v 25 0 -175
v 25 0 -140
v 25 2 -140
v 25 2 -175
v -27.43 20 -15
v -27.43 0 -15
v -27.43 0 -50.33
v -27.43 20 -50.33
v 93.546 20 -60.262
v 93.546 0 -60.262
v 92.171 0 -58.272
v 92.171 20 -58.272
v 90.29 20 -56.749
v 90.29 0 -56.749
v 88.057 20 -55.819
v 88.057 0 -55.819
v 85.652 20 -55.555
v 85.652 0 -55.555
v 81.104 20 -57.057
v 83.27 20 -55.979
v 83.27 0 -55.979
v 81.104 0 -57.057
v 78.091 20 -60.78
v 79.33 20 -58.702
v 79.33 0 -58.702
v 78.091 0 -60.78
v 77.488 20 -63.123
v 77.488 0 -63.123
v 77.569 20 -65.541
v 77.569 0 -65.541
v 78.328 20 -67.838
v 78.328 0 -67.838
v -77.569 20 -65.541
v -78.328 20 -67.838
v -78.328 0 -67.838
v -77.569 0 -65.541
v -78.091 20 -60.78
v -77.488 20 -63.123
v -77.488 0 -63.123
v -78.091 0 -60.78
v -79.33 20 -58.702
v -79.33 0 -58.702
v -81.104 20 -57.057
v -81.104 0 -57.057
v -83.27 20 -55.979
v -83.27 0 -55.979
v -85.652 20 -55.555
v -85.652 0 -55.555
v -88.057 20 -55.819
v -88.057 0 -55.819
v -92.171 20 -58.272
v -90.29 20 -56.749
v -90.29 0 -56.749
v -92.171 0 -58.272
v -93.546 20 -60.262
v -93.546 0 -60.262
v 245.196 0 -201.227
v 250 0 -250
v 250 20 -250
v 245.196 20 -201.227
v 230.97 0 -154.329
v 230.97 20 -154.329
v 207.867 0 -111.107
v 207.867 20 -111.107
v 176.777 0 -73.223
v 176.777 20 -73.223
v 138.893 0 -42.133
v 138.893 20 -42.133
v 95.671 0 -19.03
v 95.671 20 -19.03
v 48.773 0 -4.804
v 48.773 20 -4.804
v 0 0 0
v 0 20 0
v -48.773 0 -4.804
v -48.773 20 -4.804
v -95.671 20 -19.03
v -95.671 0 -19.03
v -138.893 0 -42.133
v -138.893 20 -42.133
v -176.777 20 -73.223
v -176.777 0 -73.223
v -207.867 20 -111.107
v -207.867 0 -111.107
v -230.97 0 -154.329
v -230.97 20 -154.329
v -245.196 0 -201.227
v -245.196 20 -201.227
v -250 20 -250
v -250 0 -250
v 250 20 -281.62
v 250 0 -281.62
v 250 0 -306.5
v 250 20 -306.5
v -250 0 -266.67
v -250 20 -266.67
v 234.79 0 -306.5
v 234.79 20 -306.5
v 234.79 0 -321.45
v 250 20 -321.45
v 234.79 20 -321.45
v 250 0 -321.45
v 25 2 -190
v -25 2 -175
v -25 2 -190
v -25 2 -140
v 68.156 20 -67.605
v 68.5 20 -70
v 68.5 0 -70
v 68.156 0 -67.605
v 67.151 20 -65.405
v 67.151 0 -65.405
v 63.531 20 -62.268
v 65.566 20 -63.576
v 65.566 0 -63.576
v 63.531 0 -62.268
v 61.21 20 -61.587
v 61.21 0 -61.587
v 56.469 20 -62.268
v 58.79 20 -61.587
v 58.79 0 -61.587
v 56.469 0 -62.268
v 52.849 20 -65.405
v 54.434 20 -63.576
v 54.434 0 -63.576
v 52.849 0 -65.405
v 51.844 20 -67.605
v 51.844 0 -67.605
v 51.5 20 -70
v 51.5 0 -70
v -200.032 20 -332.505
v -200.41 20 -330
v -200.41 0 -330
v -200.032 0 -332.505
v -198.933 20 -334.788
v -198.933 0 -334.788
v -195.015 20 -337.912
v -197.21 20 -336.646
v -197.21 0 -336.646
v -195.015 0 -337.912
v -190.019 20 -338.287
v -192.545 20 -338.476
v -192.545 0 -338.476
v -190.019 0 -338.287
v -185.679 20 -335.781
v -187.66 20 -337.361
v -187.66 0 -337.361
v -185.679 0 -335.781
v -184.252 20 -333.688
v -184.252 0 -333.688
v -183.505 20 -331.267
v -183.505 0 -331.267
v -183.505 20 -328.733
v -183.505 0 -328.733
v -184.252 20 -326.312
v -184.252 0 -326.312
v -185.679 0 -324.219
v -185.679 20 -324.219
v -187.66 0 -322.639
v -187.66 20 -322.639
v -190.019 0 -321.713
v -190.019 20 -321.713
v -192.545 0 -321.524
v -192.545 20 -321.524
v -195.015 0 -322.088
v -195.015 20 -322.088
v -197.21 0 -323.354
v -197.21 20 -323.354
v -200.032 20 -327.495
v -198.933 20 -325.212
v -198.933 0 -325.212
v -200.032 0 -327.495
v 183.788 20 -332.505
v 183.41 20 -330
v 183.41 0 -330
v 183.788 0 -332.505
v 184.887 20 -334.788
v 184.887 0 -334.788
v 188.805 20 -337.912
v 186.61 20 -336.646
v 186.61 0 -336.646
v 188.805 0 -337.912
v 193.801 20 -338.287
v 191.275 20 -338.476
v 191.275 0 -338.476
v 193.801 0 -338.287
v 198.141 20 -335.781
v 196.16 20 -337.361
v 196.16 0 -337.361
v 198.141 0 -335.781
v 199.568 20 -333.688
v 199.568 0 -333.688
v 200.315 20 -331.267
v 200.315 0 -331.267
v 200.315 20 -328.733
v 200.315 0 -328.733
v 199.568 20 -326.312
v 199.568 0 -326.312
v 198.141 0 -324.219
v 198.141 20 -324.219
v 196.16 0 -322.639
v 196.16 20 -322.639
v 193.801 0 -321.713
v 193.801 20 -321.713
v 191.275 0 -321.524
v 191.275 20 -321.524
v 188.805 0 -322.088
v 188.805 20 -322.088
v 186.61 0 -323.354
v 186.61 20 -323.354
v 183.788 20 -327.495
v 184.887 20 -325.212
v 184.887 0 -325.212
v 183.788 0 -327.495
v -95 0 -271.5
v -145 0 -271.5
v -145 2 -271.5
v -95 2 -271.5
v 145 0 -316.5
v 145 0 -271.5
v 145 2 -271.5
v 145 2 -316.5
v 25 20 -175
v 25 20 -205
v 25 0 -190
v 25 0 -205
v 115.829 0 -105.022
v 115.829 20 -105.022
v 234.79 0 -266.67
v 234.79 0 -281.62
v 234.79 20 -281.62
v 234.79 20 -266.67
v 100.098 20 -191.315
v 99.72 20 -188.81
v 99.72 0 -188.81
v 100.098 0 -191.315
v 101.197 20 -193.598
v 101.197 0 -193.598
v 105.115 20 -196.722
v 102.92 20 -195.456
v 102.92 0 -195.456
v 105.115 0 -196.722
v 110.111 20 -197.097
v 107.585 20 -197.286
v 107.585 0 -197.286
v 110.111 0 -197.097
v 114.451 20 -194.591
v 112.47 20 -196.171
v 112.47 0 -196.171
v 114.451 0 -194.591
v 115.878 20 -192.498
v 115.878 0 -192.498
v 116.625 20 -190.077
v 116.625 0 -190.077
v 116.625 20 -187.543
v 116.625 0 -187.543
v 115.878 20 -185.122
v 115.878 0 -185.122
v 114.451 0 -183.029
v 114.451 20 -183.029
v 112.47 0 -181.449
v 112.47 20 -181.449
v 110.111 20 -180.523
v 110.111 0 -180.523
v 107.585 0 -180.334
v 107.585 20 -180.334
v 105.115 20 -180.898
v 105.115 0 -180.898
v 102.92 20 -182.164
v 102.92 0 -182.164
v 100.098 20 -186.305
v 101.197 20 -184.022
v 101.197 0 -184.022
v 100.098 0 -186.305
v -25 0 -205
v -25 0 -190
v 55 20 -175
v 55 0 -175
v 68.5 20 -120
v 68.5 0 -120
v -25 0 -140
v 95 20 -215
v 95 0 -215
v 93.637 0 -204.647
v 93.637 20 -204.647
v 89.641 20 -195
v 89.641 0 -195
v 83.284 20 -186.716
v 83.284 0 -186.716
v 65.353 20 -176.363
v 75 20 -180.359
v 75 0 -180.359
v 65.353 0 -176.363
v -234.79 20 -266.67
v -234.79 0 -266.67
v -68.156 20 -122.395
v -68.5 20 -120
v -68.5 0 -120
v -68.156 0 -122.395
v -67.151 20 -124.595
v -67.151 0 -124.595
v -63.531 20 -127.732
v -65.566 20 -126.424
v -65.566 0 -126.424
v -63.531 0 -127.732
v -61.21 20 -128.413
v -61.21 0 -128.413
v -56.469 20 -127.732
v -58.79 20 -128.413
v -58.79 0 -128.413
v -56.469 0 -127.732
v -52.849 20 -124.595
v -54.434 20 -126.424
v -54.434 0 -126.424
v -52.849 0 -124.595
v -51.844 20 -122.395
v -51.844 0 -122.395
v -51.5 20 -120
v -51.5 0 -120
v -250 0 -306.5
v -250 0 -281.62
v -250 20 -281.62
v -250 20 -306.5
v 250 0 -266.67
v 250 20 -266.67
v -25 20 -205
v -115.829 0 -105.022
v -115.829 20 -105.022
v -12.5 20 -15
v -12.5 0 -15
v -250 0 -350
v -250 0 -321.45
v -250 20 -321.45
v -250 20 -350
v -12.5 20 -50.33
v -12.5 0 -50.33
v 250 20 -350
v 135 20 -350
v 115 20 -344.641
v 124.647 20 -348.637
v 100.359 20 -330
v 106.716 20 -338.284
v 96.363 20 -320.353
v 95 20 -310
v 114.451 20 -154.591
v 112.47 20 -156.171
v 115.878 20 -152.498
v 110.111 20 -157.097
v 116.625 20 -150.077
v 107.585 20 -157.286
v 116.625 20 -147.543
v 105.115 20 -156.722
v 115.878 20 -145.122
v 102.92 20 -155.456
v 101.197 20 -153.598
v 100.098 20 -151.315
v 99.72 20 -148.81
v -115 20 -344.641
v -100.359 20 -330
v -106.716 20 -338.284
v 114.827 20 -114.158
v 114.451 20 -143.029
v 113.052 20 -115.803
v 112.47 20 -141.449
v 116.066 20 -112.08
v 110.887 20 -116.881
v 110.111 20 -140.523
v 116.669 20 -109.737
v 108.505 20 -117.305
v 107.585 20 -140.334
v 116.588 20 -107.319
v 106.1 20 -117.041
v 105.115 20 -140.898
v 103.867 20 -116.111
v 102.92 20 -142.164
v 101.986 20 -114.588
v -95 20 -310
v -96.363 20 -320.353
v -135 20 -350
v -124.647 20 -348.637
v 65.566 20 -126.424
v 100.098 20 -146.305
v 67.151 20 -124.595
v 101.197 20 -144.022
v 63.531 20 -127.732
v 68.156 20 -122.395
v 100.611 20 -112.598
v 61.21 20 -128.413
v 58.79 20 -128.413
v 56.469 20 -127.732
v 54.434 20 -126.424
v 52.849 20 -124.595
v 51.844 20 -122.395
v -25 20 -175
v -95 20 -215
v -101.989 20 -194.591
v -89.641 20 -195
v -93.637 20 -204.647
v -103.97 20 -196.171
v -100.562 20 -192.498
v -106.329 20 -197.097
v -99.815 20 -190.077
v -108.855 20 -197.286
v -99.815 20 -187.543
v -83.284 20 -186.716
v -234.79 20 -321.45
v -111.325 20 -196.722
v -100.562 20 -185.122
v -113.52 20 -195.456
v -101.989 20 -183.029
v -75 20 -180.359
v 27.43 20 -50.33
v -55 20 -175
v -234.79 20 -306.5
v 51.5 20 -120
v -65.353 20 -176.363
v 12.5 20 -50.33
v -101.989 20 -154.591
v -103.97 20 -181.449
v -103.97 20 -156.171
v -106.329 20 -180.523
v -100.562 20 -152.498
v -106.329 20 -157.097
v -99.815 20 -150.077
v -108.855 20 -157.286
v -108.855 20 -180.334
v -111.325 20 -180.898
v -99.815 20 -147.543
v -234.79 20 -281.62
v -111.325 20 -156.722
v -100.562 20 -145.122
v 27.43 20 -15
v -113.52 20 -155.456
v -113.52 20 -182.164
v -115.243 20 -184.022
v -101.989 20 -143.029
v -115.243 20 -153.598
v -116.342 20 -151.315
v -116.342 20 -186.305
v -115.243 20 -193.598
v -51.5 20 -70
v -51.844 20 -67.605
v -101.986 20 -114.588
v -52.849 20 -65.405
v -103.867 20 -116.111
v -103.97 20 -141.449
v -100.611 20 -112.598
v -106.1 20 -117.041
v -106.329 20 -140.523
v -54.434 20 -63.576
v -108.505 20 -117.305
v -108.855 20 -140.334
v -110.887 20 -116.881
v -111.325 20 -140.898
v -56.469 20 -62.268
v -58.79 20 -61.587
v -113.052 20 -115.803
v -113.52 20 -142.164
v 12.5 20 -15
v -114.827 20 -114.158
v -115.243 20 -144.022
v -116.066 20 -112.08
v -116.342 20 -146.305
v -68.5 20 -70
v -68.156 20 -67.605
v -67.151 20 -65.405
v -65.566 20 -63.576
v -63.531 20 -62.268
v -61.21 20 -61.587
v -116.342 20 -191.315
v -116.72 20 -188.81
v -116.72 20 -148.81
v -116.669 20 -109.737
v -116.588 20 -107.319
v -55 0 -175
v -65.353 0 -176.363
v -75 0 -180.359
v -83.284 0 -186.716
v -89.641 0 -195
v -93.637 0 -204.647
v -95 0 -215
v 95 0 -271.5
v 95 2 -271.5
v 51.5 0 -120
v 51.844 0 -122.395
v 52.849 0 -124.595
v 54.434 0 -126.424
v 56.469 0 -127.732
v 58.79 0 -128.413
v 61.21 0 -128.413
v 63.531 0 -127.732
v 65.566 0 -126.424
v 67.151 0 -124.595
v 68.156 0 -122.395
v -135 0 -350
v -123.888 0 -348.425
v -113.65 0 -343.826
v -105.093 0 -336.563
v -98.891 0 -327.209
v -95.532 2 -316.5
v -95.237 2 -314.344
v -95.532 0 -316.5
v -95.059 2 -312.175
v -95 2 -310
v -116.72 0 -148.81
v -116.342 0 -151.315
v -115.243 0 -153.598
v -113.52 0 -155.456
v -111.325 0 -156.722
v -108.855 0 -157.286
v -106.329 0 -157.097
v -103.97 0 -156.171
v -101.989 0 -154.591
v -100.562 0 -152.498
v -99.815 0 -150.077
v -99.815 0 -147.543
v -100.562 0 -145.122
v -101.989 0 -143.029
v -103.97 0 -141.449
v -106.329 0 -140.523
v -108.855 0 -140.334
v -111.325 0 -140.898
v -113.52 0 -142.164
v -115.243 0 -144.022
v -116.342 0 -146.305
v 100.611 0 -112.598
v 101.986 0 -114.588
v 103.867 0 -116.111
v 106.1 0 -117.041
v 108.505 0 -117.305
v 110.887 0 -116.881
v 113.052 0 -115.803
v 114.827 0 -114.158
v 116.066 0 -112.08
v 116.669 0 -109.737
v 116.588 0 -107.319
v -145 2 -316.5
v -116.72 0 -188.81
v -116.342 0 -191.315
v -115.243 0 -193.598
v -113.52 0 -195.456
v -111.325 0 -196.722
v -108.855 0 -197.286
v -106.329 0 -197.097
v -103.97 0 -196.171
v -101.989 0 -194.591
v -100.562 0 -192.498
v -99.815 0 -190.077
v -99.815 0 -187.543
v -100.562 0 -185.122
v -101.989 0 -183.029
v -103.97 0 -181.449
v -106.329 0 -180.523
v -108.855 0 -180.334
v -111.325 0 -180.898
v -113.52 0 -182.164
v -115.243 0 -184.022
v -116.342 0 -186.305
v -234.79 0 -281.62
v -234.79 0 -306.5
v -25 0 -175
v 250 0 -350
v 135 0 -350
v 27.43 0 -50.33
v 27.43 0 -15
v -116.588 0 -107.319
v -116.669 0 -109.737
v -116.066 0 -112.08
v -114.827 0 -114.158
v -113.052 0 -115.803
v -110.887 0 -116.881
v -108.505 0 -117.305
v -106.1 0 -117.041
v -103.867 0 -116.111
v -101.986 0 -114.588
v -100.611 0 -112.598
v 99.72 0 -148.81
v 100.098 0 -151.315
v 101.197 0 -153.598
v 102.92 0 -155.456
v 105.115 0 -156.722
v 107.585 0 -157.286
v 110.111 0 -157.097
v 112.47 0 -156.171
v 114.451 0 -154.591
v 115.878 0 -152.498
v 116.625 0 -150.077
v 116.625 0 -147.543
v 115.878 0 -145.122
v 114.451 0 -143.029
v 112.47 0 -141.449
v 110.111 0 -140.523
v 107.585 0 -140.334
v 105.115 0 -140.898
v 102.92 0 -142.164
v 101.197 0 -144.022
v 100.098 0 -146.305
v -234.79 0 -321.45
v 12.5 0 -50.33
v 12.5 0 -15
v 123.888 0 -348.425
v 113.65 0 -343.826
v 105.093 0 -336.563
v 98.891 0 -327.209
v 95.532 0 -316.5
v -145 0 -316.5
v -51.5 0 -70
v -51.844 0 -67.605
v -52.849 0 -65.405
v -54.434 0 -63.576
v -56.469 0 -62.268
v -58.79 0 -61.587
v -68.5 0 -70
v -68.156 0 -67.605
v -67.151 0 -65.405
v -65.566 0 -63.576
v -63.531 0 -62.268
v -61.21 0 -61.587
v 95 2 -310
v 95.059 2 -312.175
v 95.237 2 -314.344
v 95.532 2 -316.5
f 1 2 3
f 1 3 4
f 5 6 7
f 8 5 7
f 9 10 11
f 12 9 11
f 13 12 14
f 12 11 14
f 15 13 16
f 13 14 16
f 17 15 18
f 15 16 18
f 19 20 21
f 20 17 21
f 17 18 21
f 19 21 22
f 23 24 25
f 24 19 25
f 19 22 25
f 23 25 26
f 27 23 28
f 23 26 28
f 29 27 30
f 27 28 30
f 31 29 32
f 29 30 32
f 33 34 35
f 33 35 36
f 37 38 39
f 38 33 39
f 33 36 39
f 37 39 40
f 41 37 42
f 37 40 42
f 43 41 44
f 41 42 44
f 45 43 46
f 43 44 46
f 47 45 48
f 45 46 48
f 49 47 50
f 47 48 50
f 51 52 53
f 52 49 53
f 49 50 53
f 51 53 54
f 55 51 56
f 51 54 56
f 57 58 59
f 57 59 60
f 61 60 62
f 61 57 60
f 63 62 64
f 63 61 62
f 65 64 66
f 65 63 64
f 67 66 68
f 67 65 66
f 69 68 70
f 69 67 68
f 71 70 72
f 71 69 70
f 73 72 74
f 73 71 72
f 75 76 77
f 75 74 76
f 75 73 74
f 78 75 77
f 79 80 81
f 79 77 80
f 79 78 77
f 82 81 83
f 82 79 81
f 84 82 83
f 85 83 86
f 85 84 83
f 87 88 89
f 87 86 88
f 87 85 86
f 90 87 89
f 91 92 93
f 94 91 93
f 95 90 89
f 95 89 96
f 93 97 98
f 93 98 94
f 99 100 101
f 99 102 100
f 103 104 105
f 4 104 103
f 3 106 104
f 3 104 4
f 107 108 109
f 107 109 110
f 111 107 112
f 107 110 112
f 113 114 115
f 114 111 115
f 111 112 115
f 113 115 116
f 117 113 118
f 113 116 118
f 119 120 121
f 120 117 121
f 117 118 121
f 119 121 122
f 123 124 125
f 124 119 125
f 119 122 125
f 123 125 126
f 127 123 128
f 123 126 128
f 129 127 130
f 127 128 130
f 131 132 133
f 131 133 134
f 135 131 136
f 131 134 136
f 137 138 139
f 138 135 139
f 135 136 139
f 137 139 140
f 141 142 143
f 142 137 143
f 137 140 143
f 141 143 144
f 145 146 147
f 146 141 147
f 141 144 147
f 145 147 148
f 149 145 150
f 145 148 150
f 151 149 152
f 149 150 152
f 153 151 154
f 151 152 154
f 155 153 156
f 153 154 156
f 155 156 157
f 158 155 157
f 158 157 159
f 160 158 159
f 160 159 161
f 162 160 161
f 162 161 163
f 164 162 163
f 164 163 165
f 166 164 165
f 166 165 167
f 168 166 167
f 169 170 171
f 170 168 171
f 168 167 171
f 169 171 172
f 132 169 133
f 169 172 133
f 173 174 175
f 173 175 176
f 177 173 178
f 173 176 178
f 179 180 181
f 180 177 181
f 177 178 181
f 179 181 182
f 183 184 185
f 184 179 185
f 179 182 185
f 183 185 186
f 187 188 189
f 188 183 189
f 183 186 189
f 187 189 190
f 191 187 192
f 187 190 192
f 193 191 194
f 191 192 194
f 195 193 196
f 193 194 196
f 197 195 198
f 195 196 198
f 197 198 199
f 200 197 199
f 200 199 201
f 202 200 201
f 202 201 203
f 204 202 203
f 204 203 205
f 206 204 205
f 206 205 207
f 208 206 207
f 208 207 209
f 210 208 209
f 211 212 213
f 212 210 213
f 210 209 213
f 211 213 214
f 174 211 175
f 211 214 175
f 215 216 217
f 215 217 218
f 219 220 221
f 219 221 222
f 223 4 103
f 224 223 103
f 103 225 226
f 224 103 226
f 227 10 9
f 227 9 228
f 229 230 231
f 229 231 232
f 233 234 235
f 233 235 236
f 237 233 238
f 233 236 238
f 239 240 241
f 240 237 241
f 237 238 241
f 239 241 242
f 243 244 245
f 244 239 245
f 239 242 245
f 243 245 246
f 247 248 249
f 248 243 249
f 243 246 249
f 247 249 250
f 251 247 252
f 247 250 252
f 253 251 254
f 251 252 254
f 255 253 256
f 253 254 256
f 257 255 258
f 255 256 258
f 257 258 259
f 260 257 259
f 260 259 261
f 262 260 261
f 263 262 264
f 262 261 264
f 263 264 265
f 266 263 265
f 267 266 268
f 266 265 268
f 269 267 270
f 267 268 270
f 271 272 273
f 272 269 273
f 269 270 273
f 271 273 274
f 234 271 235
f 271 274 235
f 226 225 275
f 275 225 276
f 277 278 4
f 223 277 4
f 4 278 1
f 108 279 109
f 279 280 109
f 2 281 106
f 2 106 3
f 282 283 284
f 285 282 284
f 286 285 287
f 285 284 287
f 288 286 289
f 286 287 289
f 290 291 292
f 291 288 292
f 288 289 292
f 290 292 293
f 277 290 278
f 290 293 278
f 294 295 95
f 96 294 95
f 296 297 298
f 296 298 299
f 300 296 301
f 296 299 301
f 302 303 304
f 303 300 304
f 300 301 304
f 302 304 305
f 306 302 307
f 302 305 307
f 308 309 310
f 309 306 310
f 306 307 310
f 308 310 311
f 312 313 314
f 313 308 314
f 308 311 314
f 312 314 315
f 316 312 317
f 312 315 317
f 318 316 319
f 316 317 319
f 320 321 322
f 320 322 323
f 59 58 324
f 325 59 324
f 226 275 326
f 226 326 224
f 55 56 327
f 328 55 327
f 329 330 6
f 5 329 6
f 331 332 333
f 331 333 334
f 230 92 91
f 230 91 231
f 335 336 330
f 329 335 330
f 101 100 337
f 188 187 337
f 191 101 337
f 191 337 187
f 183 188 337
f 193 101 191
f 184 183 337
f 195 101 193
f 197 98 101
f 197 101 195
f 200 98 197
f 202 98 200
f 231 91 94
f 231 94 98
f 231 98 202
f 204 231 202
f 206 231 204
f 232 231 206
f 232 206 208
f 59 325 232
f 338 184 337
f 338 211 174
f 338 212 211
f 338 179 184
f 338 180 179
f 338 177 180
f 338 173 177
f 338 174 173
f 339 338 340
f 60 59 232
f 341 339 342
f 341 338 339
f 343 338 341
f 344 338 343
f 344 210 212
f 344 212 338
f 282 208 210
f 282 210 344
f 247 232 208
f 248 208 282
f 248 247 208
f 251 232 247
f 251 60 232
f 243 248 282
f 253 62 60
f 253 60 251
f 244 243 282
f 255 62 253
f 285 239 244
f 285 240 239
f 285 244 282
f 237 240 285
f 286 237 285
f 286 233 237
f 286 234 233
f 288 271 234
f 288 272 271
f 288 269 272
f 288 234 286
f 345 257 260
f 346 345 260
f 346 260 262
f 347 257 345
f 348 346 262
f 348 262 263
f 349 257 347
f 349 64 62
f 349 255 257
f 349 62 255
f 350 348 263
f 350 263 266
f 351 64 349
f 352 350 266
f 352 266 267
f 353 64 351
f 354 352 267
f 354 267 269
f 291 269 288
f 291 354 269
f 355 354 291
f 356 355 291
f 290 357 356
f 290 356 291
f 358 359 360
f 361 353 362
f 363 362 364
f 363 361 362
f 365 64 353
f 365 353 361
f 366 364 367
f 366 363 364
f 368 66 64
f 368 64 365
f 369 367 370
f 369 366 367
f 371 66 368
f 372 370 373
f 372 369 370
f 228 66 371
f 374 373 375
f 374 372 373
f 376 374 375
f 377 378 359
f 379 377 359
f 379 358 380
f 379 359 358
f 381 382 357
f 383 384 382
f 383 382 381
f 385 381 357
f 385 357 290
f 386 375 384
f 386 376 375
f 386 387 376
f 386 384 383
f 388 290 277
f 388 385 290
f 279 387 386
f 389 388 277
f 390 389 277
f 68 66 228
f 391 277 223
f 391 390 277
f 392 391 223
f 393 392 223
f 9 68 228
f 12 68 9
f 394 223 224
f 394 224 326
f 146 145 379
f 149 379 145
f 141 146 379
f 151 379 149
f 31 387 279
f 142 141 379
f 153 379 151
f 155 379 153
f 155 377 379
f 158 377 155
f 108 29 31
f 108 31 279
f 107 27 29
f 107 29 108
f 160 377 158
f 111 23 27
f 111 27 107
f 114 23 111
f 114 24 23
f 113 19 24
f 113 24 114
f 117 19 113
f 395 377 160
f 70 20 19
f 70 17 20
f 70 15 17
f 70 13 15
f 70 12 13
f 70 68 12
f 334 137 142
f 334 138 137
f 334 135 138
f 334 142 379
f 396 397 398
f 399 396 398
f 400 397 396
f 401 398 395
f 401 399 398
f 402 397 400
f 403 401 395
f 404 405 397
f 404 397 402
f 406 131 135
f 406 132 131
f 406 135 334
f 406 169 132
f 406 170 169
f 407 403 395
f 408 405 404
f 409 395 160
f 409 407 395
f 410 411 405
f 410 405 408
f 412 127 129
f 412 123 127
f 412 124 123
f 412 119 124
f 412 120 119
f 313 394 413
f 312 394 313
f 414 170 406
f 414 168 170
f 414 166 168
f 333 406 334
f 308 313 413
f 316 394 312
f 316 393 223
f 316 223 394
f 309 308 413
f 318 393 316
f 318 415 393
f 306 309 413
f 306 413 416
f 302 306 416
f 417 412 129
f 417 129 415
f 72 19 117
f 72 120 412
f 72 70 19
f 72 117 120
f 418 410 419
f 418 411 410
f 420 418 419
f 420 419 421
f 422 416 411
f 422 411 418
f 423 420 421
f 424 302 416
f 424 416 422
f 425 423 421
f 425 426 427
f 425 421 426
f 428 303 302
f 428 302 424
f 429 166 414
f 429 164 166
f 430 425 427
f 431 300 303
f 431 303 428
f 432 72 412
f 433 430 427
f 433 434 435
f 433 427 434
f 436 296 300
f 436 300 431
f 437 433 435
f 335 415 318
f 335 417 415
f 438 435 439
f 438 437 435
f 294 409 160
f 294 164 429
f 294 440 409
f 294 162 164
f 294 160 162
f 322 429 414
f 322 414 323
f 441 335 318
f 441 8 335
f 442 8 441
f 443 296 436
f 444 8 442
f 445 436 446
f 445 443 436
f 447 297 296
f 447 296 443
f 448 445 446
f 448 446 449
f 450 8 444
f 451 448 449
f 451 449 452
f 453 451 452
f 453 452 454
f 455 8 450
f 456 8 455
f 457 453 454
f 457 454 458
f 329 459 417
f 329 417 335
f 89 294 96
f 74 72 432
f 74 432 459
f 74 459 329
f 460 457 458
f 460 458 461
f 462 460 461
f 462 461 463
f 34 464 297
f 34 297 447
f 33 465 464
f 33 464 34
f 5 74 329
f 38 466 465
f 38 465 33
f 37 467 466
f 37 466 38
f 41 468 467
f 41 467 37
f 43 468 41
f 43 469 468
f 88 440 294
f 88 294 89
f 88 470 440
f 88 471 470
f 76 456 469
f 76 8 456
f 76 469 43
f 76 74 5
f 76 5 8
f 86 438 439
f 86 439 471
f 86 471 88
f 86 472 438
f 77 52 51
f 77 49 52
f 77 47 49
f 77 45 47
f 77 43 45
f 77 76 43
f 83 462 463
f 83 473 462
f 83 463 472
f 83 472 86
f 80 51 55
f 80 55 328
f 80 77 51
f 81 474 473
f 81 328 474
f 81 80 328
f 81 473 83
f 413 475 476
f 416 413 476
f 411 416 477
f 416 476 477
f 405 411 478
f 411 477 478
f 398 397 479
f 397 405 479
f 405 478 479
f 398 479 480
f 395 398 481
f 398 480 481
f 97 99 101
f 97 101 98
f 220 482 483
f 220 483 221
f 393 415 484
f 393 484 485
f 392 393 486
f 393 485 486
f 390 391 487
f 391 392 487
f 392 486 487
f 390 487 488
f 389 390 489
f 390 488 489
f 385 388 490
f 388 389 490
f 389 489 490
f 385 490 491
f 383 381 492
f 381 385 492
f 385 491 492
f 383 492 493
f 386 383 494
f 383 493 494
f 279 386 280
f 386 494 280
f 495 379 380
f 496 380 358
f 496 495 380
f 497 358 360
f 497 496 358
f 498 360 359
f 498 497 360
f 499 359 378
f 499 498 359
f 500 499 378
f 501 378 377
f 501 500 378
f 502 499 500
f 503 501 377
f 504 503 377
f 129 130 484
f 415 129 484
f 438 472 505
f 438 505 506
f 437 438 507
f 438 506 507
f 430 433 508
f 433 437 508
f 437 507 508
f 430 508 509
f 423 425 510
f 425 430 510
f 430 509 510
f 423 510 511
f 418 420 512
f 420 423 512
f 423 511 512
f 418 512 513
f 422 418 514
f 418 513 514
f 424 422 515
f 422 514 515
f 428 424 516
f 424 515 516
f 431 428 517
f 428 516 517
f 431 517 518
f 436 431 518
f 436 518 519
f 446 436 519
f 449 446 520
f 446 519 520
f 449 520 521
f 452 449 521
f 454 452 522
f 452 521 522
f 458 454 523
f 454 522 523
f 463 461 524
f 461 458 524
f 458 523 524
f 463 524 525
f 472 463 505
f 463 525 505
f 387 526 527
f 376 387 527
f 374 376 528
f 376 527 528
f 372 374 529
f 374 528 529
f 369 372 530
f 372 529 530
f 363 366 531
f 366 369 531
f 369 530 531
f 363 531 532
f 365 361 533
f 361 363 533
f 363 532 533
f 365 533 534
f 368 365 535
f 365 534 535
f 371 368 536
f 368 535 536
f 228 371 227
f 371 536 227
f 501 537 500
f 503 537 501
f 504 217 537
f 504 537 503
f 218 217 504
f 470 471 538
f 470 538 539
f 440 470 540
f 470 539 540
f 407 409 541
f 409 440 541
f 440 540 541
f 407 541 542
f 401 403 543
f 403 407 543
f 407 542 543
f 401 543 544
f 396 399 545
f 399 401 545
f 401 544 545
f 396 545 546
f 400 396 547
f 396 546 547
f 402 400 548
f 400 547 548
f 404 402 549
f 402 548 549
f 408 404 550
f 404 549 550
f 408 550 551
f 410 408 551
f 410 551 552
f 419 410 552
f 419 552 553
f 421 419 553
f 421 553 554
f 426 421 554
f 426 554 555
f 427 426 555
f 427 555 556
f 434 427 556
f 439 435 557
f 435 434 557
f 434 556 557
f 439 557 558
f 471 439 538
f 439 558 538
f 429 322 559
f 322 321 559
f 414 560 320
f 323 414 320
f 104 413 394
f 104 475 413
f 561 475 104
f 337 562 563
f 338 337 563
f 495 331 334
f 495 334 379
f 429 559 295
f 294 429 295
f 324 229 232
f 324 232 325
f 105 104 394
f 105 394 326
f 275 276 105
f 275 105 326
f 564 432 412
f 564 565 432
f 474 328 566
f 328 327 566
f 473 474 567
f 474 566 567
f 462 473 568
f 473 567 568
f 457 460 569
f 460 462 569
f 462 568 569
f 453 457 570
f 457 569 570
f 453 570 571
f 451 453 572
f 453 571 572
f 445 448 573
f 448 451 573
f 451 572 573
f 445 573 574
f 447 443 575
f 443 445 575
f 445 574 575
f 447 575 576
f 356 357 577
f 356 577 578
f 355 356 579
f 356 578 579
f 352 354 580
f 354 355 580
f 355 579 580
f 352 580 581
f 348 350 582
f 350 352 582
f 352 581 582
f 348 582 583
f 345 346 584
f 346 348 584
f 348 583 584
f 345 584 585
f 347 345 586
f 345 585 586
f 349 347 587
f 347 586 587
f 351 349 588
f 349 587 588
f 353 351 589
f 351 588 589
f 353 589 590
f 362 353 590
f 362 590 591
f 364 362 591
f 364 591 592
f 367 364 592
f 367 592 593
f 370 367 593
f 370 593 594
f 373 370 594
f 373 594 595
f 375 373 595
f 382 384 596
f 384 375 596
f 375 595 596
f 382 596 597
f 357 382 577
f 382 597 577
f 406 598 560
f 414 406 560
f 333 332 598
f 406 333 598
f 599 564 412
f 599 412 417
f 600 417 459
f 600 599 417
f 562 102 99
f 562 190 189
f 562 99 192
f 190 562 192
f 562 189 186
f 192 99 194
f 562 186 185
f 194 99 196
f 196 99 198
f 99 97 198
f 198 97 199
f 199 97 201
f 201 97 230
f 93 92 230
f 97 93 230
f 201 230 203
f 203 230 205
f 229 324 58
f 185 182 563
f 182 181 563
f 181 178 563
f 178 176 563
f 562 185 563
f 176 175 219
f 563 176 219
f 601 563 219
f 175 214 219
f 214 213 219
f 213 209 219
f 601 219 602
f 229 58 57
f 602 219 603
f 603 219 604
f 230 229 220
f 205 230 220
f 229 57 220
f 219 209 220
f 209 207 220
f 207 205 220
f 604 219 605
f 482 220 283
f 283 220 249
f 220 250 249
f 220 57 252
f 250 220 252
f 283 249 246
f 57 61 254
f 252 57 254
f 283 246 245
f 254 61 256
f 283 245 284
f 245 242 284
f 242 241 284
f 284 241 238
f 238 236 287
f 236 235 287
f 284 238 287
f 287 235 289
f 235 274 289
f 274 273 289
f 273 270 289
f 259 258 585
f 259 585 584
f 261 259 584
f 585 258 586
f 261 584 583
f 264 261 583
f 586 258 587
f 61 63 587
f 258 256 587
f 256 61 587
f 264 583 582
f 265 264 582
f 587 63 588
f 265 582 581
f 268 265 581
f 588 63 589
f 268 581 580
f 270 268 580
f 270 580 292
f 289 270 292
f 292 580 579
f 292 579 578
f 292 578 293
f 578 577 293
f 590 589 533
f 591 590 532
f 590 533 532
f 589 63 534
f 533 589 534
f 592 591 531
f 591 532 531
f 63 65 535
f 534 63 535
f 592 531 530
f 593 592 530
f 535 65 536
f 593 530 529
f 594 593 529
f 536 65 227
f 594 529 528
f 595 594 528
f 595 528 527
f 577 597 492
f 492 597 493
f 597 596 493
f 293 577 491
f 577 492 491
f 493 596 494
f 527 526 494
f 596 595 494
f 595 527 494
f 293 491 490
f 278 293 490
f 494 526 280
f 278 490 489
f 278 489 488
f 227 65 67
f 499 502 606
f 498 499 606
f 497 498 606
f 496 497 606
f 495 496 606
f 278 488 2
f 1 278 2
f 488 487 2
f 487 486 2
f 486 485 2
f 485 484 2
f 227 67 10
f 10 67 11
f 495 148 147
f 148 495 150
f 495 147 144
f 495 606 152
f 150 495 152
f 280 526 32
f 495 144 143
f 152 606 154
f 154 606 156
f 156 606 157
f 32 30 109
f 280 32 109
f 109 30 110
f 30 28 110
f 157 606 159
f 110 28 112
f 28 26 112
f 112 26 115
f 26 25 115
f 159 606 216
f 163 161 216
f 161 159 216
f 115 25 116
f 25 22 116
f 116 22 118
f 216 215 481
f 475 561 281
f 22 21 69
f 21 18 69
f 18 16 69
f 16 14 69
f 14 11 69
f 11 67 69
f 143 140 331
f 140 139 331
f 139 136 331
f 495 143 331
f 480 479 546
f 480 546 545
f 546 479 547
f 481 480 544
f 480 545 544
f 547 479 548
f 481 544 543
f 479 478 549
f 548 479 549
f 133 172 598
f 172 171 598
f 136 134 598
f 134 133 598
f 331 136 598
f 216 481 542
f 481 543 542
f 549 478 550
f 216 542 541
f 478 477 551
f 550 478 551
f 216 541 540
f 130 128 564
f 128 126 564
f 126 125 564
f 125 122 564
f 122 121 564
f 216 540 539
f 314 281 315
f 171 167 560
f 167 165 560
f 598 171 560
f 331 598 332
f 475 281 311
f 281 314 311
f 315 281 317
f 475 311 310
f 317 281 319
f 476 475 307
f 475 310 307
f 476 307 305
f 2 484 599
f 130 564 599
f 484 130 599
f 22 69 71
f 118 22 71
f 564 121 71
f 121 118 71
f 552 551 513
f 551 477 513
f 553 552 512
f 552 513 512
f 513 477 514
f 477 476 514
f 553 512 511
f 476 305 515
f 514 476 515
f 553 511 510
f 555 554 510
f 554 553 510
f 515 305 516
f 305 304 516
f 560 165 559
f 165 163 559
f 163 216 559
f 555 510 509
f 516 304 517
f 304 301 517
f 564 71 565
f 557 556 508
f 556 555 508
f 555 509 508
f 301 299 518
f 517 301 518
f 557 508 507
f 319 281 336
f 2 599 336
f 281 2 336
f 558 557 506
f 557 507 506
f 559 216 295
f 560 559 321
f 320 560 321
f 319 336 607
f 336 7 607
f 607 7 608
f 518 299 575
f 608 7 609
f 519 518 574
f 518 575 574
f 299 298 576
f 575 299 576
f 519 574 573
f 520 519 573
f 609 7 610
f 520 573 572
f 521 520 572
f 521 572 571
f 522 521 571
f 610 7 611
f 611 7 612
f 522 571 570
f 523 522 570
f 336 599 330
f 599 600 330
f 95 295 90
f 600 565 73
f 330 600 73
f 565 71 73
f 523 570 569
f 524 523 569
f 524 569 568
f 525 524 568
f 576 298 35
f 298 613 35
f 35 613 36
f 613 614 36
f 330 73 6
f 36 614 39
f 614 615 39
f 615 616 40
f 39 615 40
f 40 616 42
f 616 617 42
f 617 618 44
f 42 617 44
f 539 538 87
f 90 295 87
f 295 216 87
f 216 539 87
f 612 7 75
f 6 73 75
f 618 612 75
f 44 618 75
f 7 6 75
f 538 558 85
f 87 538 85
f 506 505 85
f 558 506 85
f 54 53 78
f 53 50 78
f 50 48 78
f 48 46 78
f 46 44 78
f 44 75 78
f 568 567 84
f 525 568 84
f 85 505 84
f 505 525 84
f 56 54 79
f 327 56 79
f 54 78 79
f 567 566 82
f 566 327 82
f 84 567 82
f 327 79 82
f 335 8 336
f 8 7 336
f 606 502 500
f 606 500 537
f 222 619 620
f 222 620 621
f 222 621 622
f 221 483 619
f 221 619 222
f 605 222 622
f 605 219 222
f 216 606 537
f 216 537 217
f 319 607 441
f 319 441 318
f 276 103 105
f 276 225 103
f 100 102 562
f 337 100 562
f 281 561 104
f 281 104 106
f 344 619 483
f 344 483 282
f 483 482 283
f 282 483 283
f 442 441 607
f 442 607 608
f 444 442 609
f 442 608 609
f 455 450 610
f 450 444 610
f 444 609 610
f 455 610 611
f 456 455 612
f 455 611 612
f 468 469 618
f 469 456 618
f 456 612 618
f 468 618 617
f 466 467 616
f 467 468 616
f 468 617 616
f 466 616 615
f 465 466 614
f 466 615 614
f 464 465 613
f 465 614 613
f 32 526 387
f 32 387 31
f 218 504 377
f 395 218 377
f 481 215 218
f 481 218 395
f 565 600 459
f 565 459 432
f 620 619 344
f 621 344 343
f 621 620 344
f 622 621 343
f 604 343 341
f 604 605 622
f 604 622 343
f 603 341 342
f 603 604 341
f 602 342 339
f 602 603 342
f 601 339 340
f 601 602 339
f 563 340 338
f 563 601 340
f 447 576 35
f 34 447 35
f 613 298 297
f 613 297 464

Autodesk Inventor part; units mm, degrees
ref_plane "YZ Plane" through (0, 0, 0) normal (1, 0, 0) x (0, 1, 0)
ref_plane "XZ Plane" through (0, 0, 0) normal (0, 1, 0) x (-1, 0, 0)
ref_plane "XY Plane" through (0, 0, 0) normal (0, 0, 1) x (1, 0, 0)
sketch "Эскиз1" plane through (0, 0, 0) normal (0, 1, 0) x (-1, 0, 0)
  line L0 (0, 0) -> (0, -235.2683) construction
  line L1 (250, -250) -> (250, -350)
  line L2 (250, -350) -> (135, -350)
  arc A0 (95, -310) -> (135, -350) centre (135, -310) ccw
  line L3 (95, -310) -> (95, -215)
  arc A1 (95, -215) -> (55, -175) centre (55, -215) ccw
  line L4 (25, -175) -> (25, -205)
  line L5 (25, -205) -> (0, -205)
  line L6 (55, -175) -> (25, -175)
  line L7 (60, -70) -> (60, -120) construction
  line L8 (51.5, -70) -> (51.5, -120)
  line L9 (68.5, -120) -> (68.5, -70)
  arc A2 (68.5, -70) -> (51.5, -70) centre (60, -70) ccw
  arc A3 (51.5, -120) -> (68.5, -120) centre (60, -120) ccw
  line L10 (85.9368, -64.05) -> (108.22, -108.81) construction
  line L11 (93.546, -60.2619) -> (115.8292, -105.0219)
  line L12 (100.6108, -112.5981) -> (78.3276, -67.8381)
  arc A4 (93.546, -60.2619) -> (78.3276, -67.8381) centre (85.9368, -64.05) ccw
  arc A5 (100.6108, -112.5981) -> (115.8292, -105.0219) centre (108.22, -108.81) ccw
  line L13 (12.5, -15) -> (27.43, -15)
  line L14 (27.43, -15) -> (27.43, -50.33)
  line L15 (27.43, -50.33) -> (12.5, -50.33)
  line L16 (12.5, -50.33) -> (12.5, -15)
  circle A6 centre (108.22, -148.81) radius 8.5
  circle A7 centre (108.22, -188.81) radius 8.5
  circle A8 centre (191.91, -330) radius 8.5
  line L17 (-250, -250) -> (-250, -350)
  line L18 (-250, -350) -> (-135, -350)
  arc A9 (-135, -350) -> (-95, -310) centre (-135, -310) ccw
  line L19 (-95, -310) -> (-95, -215)
  arc A10 (-55, -175) -> (-95, -215) centre (-55, -215) ccw
  line L20 (-25, -175) -> (-25, -205)
  line L21 (-25, -205) -> (0, -205)
  line L22 (-55, -175) -> (-25, -175)
  line L23 (-60, -70) -> (-60, -120) construction
  line L24 (-51.5, -70) -> (-51.5, -120)
  line L25 (-68.5, -120) -> (-68.5, -70)
  arc A11 (-51.5, -70) -> (-68.5, -70) centre (-60, -70) ccw
  arc A12 (-68.5, -120) -> (-51.5, -120) centre (-60, -120) ccw
  line L26 (-85.9368, -64.05) -> (-108.22, -108.81) construction
  line L27 (-93.546, -60.2619) -> (-115.8292, -105.0219)
  line L28 (-100.6108, -112.5981) -> (-78.3276, -67.8381)
  arc A13 (-78.3276, -67.8381) -> (-93.546, -60.2619) centre (-85.9368, -64.05) ccw
  arc A14 (-115.8292, -105.0219) -> (-100.6108, -112.5981) centre (-108.22, -108.81) ccw
  line L29 (-12.5, -15) -> (-27.43, -15)
  line L30 (-27.43, -15) -> (-27.43, -50.33)
  line L31 (-27.43, -50.33) -> (-12.5, -50.33)
  line L32 (-12.5, -50.33) -> (-12.5, -15)
  circle A15 centre (-108.22, -148.81) radius 8.5
  circle A16 centre (-108.22, -188.81) radius 8.5
  circle A17 centre (-191.91, -330) radius 8.5
  arc A18 (250, -250) -> (-250, -250) centre (0, -250) ccw
  line L33 (250, -321.45) -> (234.79, -321.45)
  line L34 (234.79, -321.45) -> (234.79, -306.5)
  line L35 (234.79, -306.5) -> (250, -306.5)
  line L36 (250, -281.62) -> (234.79, -281.62)
  line L37 (234.79, -281.62) -> (234.79, -266.67)
  line L38 (234.79, -266.67) -> (250, -266.67)
  line L39 (-250, -321.45) -> (-234.79, -321.45)
  line L40 (-234.79, -321.45) -> (-234.79, -306.5)
  line L41 (-234.79, -306.5) -> (-250, -306.5)
  line L42 (-250, -281.62) -> (-234.79, -281.62)
  line L43 (-234.79, -281.62) -> (-234.79, -266.67)
  line L44 (-234.79, -266.67) -> (-250, -266.67)
  point P0 (60, -95)
  point P1 (97.0784, -86.43)
  point P2 (-60, -95)
  point P3 (-97.0784, -86.43)
  dimension "d2" = 115
  dimension "d4" = 40
  dimension "d5" = 30
  dimension "d7" = 250
  dimension "d9" = 25
  dimension "d10" = 350
  dimension "d11" = 95
  dimension "d12" = 30
  dimension "d13" = 50
  dimension "d14" = 8.5
  dimension "d15" = 64.05
  dimension "d16" = 141.78
  dimension "d17" = 48.22
  dimension "d18" = 70
  dimension "d20" = 241.19
  dimension "d21" = 14.93
  dimension "d22" = 35.33
  dimension "d23" = 12.5
  dimension "d24" = 15
  dimension "d25" = 17
  dimension "d26" = 40
  dimension "d27" = 161.19
  dimension "d28" = 141.78
  dimension "d29" = 20
  dimension "d30" = 58.09
  dimension "d34" = 15.21
  dimension "d35" = 28.55
  dimension "d36" = 14.95
  dimension "d37" = 24.88
  dimension "d47" = 24.88
  dimension "d48" = 28.55
  dimension "d49" = 14.95
  dimension "d50" = 15.21
extrude "Пластина1" add sketch "Эскиз1" along normal blind 20 contours L1 L38 L37 L36 L35 L34 L33 L2 A0 L3 A1 L6 L4 L5 L21 L20 L22 A10 L19 A9 L18 L17 L39 L40 L41 L42 L43 L44 A18
sketch "Эскиз2" plane through (0, 0, 0) normal (0, -1, 0) x (1, 0, 0)
  arc A0 (100.6108, -112.5981) -> (115.8292, -105.0219) centre (108.22, -108.81) ccw projected
  line L0 (100.6108, -112.5981) -> (78.3276, -67.8381) projected
  arc A1 (93.546, -60.2619) -> (78.3276, -67.8381) centre (85.9368, -64.05) ccw projected
  line L1 (93.546, -60.2619) -> (115.8292, -105.0219) projected
  arc A2 (51.5, -120) -> (68.5, -120) centre (60, -120) ccw projected
  line L2 (51.5, -120) -> (51.5, -70) projected
  arc A3 (68.5, -70) -> (51.5, -70) centre (60, -70) ccw projected
  line L3 (68.5, -70) -> (68.5, -120) projected
  arc A4 (-115.8292, -105.0219) -> (-100.6108, -112.5981) centre (-108.22, -108.81) ccw projected
  line L4 (-115.8292, -105.0219) -> (-93.546, -60.2619) projected
  arc A5 (-78.3276, -67.8381) -> (-93.546, -60.2619) centre (-85.9368, -64.05) ccw projected
  line L5 (-78.3276, -67.8381) -> (-100.6108, -112.5981) projected
  arc A6 (-51.5, -70) -> (-68.5, -70) centre (-60, -70) ccw projected
  line L6 (-51.5, -70) -> (-51.5, -120) projected
  arc A7 (-68.5, -120) -> (-51.5, -120) centre (-60, -120) ccw projected
  line L7 (-68.5, -120) -> (-68.5, -70) projected
  line L8 (12.5, -15) -> (27.43, -15) projected
  line L9 (27.43, -15) -> (27.43, -50.33) projected
  line L10 (27.43, -50.33) -> (12.5, -50.33) projected
  line L11 (12.5, -50.33) -> (12.5, -15) projected
  line L12 (-27.43, -50.33) -> (-27.43, -15) projected
  line L13 (-27.43, -15) -> (-12.5, -15) projected
  line L14 (-12.5, -15) -> (-12.5, -50.33) projected
  line L15 (-12.5, -50.33) -> (-27.43, -50.33) projected
  circle A8 centre (191.91, -330) radius 8.5 projected
  circle A9 centre (108.22, -188.81) radius 8.5 projected
  circle A10 centre (108.22, -148.81) radius 8.5 projected
  circle A11 centre (-191.91, -330) radius 8.5 projected
  circle A12 centre (-108.22, -188.81) radius 8.5 projected
  circle A13 centre (-108.22, -148.81) radius 8.5 projected
  arc A14 (250, -250) -> (-250, -250) centre (0, -250) ccw projected
  line L16 (-250, -266.67) -> (-250, -250) projected
  line L17 (-234.79, -266.67) -> (-250, -266.67) projected
  line L18 (-234.79, -281.62) -> (-234.79, -266.67) projected
  line L19 (-250, -281.62) -> (-234.79, -281.62) projected
  line L20 (-250, -306.5) -> (-250, -281.62) projected
  line L21 (-234.79, -306.5) -> (-250, -306.5) projected
  line L22 (-234.79, -321.45) -> (-234.79, -306.5) projected
  line L23 (-250, -321.45) -> (-234.79, -321.45) projected
  line L24 (-250, -350) -> (-250, -321.45) projected
  line L25 (-135, -350) -> (-250, -350) projected
  arc A15 (-135, -350) -> (-95, -310) centre (-135, -310) ccw projected
  line L26 (-95, -215) -> (-95, -310) projected
  arc A16 (-55, -175) -> (-95, -215) centre (-55, -215) ccw projected
  line L27 (-25, -175) -> (-55, -175) projected
  line L28 (-25, -205) -> (-25, -175) projected
  line L29 (25, -205) -> (-25, -205) projected
  line L30 (25, -175) -> (25, -205) projected
  line L31 (55, -175) -> (25, -175) projected
  arc A17 (95, -215) -> (55, -175) centre (55, -215) ccw projected
  line L32 (95, -310) -> (95, -215) projected
  arc A18 (95, -310) -> (135, -350) centre (135, -310) ccw projected
  line L33 (250, -350) -> (135, -350) projected
  line L34 (250, -321.45) -> (250, -350) projected
  line L35 (25, -190) -> (-25, -190)
  line L36 (-25, -190) -> (-25, -140)
  line L37 (-25, -140) -> (25, -140)
  line L38 (25, -140) -> (25, -190)
  line L39 (95, -310) -> (95, -215) projected
  line L40 (95, -271.5) -> (145, -271.5)
  line L41 (145, -271.5) -> (145, -316.5)
  line L42 (145, -316.5) -> (95, -316.5)
  line L43 (95, -316.5) -> (95, -271.5)
  line L44 (-95, -215) -> (-95, -310) projected
  line L45 (-95, -316.5) -> (-145, -316.5)
  line L46 (-145, -316.5) -> (-145, -271.5)
  line L47 (-145, -271.5) -> (-95, -271.5)
  line L48 (-95, -271.5) -> (-95, -316.5)
  line L49 (234.79, -321.45) -> (250, -321.45) projected
  line L50 (234.79, -306.5) -> (234.79, -321.45) projected
  line L51 (250, -306.5) -> (234.79, -306.5) projected
  line L52 (250, -281.62) -> (250, -306.5) projected
  line L53 (234.79, -281.62) -> (250, -281.62) projected
  line L54 (234.79, -266.67) -> (234.79, -281.62) projected
  line L55 (250, -266.67) -> (234.79, -266.67) projected
  line L56 (250, -250) -> (250, -266.67) projected
  point P0 (0, 0)
  point P1 (0, -190)
  point P2 (0, -205)
  dimension "d38" = 50
  dimension "d39" = 45
  dimension "d40" = 33.5
  dimension "d41" = 50
  dimension "d42" = 50
  dimension "d43" = 50
  dimension "d44" = 15
extrude "Вырез1" cut sketch "Эскиз2" against normal blind 2 contours L42 L43 A18 | A18 L32 L40 L41 L42 | L45 L46 L47 L26 A15 | A15 L48 L45 | L30 L35 L28 L36 L37 L38
equation "\"d33\" = Толщина"
equation "\"Толщина\" = 20"
properties part number "Lift.03.00.00.02"
